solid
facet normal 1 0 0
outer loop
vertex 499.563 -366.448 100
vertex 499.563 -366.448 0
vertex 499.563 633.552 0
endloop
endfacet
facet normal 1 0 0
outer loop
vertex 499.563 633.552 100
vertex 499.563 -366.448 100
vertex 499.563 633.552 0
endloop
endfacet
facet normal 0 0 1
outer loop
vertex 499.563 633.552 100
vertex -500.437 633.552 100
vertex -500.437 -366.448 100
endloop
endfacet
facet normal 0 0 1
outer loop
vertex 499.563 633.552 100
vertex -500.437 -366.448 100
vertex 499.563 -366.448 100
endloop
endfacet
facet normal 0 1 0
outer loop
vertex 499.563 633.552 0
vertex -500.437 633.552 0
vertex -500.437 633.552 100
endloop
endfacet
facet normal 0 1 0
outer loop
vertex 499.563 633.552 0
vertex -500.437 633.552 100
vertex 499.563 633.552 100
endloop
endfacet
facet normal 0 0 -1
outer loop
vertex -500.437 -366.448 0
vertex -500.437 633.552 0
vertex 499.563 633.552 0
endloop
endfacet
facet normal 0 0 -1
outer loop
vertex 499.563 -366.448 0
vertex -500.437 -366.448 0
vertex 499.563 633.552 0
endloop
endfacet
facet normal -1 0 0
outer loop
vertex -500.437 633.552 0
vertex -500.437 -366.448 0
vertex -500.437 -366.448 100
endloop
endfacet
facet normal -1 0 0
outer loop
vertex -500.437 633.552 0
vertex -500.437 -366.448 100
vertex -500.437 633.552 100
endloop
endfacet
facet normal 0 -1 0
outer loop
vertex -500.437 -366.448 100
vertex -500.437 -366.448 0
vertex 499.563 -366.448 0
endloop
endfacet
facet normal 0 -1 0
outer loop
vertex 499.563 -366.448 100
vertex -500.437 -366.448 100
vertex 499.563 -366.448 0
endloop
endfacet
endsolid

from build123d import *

# Parameters (mm, degrees)
F0_W     = 1000
F0_H     = 1000
F1_DEPTH = 100
F4_DEPTH = 80
F5_DEPTH = 80


# Not quite as in the source:
# - the program builds the solid bodies; features that only make, move or delete a surface that nothing else refers to are left out


with BuildPart() as f1:
    # F0 (on Top) → F1 (new body)
    with BuildSketch(Plane.XY):
        with Locations((-0.4372149706, 133.5517169366)):
            Rectangle(F0_W, F0_H)
    extrude(amount=F1_DEPTH)

    # F2 (on Top) → F4 (cut)
    with BuildSketch(Plane.XY):
        Polygon((66.5457851066, 298.988878727), (-66.5457851066, 298.988878727), (-160.6557369232, 204.8789269104), (-160.6557369232, 71.7873566971), (-66.5457851066, -22.3225951195), (66.5457851066, -22.3225951195), (160.6557369232, 71.7873566971), (160.6557369232, 204.8789269104), align=None)
    extrude(amount=F4_DEPTH, mode=Mode.SUBTRACT)

    # F5 (add): a face of the model
    f5_faces = [f1.faces().sort_by_distance(p)[0] for p in [
        (0, 138.3331418037, 80),
    ]]
    extrude(f5_faces, amount=F5_DEPTH)


solid = f1.part
